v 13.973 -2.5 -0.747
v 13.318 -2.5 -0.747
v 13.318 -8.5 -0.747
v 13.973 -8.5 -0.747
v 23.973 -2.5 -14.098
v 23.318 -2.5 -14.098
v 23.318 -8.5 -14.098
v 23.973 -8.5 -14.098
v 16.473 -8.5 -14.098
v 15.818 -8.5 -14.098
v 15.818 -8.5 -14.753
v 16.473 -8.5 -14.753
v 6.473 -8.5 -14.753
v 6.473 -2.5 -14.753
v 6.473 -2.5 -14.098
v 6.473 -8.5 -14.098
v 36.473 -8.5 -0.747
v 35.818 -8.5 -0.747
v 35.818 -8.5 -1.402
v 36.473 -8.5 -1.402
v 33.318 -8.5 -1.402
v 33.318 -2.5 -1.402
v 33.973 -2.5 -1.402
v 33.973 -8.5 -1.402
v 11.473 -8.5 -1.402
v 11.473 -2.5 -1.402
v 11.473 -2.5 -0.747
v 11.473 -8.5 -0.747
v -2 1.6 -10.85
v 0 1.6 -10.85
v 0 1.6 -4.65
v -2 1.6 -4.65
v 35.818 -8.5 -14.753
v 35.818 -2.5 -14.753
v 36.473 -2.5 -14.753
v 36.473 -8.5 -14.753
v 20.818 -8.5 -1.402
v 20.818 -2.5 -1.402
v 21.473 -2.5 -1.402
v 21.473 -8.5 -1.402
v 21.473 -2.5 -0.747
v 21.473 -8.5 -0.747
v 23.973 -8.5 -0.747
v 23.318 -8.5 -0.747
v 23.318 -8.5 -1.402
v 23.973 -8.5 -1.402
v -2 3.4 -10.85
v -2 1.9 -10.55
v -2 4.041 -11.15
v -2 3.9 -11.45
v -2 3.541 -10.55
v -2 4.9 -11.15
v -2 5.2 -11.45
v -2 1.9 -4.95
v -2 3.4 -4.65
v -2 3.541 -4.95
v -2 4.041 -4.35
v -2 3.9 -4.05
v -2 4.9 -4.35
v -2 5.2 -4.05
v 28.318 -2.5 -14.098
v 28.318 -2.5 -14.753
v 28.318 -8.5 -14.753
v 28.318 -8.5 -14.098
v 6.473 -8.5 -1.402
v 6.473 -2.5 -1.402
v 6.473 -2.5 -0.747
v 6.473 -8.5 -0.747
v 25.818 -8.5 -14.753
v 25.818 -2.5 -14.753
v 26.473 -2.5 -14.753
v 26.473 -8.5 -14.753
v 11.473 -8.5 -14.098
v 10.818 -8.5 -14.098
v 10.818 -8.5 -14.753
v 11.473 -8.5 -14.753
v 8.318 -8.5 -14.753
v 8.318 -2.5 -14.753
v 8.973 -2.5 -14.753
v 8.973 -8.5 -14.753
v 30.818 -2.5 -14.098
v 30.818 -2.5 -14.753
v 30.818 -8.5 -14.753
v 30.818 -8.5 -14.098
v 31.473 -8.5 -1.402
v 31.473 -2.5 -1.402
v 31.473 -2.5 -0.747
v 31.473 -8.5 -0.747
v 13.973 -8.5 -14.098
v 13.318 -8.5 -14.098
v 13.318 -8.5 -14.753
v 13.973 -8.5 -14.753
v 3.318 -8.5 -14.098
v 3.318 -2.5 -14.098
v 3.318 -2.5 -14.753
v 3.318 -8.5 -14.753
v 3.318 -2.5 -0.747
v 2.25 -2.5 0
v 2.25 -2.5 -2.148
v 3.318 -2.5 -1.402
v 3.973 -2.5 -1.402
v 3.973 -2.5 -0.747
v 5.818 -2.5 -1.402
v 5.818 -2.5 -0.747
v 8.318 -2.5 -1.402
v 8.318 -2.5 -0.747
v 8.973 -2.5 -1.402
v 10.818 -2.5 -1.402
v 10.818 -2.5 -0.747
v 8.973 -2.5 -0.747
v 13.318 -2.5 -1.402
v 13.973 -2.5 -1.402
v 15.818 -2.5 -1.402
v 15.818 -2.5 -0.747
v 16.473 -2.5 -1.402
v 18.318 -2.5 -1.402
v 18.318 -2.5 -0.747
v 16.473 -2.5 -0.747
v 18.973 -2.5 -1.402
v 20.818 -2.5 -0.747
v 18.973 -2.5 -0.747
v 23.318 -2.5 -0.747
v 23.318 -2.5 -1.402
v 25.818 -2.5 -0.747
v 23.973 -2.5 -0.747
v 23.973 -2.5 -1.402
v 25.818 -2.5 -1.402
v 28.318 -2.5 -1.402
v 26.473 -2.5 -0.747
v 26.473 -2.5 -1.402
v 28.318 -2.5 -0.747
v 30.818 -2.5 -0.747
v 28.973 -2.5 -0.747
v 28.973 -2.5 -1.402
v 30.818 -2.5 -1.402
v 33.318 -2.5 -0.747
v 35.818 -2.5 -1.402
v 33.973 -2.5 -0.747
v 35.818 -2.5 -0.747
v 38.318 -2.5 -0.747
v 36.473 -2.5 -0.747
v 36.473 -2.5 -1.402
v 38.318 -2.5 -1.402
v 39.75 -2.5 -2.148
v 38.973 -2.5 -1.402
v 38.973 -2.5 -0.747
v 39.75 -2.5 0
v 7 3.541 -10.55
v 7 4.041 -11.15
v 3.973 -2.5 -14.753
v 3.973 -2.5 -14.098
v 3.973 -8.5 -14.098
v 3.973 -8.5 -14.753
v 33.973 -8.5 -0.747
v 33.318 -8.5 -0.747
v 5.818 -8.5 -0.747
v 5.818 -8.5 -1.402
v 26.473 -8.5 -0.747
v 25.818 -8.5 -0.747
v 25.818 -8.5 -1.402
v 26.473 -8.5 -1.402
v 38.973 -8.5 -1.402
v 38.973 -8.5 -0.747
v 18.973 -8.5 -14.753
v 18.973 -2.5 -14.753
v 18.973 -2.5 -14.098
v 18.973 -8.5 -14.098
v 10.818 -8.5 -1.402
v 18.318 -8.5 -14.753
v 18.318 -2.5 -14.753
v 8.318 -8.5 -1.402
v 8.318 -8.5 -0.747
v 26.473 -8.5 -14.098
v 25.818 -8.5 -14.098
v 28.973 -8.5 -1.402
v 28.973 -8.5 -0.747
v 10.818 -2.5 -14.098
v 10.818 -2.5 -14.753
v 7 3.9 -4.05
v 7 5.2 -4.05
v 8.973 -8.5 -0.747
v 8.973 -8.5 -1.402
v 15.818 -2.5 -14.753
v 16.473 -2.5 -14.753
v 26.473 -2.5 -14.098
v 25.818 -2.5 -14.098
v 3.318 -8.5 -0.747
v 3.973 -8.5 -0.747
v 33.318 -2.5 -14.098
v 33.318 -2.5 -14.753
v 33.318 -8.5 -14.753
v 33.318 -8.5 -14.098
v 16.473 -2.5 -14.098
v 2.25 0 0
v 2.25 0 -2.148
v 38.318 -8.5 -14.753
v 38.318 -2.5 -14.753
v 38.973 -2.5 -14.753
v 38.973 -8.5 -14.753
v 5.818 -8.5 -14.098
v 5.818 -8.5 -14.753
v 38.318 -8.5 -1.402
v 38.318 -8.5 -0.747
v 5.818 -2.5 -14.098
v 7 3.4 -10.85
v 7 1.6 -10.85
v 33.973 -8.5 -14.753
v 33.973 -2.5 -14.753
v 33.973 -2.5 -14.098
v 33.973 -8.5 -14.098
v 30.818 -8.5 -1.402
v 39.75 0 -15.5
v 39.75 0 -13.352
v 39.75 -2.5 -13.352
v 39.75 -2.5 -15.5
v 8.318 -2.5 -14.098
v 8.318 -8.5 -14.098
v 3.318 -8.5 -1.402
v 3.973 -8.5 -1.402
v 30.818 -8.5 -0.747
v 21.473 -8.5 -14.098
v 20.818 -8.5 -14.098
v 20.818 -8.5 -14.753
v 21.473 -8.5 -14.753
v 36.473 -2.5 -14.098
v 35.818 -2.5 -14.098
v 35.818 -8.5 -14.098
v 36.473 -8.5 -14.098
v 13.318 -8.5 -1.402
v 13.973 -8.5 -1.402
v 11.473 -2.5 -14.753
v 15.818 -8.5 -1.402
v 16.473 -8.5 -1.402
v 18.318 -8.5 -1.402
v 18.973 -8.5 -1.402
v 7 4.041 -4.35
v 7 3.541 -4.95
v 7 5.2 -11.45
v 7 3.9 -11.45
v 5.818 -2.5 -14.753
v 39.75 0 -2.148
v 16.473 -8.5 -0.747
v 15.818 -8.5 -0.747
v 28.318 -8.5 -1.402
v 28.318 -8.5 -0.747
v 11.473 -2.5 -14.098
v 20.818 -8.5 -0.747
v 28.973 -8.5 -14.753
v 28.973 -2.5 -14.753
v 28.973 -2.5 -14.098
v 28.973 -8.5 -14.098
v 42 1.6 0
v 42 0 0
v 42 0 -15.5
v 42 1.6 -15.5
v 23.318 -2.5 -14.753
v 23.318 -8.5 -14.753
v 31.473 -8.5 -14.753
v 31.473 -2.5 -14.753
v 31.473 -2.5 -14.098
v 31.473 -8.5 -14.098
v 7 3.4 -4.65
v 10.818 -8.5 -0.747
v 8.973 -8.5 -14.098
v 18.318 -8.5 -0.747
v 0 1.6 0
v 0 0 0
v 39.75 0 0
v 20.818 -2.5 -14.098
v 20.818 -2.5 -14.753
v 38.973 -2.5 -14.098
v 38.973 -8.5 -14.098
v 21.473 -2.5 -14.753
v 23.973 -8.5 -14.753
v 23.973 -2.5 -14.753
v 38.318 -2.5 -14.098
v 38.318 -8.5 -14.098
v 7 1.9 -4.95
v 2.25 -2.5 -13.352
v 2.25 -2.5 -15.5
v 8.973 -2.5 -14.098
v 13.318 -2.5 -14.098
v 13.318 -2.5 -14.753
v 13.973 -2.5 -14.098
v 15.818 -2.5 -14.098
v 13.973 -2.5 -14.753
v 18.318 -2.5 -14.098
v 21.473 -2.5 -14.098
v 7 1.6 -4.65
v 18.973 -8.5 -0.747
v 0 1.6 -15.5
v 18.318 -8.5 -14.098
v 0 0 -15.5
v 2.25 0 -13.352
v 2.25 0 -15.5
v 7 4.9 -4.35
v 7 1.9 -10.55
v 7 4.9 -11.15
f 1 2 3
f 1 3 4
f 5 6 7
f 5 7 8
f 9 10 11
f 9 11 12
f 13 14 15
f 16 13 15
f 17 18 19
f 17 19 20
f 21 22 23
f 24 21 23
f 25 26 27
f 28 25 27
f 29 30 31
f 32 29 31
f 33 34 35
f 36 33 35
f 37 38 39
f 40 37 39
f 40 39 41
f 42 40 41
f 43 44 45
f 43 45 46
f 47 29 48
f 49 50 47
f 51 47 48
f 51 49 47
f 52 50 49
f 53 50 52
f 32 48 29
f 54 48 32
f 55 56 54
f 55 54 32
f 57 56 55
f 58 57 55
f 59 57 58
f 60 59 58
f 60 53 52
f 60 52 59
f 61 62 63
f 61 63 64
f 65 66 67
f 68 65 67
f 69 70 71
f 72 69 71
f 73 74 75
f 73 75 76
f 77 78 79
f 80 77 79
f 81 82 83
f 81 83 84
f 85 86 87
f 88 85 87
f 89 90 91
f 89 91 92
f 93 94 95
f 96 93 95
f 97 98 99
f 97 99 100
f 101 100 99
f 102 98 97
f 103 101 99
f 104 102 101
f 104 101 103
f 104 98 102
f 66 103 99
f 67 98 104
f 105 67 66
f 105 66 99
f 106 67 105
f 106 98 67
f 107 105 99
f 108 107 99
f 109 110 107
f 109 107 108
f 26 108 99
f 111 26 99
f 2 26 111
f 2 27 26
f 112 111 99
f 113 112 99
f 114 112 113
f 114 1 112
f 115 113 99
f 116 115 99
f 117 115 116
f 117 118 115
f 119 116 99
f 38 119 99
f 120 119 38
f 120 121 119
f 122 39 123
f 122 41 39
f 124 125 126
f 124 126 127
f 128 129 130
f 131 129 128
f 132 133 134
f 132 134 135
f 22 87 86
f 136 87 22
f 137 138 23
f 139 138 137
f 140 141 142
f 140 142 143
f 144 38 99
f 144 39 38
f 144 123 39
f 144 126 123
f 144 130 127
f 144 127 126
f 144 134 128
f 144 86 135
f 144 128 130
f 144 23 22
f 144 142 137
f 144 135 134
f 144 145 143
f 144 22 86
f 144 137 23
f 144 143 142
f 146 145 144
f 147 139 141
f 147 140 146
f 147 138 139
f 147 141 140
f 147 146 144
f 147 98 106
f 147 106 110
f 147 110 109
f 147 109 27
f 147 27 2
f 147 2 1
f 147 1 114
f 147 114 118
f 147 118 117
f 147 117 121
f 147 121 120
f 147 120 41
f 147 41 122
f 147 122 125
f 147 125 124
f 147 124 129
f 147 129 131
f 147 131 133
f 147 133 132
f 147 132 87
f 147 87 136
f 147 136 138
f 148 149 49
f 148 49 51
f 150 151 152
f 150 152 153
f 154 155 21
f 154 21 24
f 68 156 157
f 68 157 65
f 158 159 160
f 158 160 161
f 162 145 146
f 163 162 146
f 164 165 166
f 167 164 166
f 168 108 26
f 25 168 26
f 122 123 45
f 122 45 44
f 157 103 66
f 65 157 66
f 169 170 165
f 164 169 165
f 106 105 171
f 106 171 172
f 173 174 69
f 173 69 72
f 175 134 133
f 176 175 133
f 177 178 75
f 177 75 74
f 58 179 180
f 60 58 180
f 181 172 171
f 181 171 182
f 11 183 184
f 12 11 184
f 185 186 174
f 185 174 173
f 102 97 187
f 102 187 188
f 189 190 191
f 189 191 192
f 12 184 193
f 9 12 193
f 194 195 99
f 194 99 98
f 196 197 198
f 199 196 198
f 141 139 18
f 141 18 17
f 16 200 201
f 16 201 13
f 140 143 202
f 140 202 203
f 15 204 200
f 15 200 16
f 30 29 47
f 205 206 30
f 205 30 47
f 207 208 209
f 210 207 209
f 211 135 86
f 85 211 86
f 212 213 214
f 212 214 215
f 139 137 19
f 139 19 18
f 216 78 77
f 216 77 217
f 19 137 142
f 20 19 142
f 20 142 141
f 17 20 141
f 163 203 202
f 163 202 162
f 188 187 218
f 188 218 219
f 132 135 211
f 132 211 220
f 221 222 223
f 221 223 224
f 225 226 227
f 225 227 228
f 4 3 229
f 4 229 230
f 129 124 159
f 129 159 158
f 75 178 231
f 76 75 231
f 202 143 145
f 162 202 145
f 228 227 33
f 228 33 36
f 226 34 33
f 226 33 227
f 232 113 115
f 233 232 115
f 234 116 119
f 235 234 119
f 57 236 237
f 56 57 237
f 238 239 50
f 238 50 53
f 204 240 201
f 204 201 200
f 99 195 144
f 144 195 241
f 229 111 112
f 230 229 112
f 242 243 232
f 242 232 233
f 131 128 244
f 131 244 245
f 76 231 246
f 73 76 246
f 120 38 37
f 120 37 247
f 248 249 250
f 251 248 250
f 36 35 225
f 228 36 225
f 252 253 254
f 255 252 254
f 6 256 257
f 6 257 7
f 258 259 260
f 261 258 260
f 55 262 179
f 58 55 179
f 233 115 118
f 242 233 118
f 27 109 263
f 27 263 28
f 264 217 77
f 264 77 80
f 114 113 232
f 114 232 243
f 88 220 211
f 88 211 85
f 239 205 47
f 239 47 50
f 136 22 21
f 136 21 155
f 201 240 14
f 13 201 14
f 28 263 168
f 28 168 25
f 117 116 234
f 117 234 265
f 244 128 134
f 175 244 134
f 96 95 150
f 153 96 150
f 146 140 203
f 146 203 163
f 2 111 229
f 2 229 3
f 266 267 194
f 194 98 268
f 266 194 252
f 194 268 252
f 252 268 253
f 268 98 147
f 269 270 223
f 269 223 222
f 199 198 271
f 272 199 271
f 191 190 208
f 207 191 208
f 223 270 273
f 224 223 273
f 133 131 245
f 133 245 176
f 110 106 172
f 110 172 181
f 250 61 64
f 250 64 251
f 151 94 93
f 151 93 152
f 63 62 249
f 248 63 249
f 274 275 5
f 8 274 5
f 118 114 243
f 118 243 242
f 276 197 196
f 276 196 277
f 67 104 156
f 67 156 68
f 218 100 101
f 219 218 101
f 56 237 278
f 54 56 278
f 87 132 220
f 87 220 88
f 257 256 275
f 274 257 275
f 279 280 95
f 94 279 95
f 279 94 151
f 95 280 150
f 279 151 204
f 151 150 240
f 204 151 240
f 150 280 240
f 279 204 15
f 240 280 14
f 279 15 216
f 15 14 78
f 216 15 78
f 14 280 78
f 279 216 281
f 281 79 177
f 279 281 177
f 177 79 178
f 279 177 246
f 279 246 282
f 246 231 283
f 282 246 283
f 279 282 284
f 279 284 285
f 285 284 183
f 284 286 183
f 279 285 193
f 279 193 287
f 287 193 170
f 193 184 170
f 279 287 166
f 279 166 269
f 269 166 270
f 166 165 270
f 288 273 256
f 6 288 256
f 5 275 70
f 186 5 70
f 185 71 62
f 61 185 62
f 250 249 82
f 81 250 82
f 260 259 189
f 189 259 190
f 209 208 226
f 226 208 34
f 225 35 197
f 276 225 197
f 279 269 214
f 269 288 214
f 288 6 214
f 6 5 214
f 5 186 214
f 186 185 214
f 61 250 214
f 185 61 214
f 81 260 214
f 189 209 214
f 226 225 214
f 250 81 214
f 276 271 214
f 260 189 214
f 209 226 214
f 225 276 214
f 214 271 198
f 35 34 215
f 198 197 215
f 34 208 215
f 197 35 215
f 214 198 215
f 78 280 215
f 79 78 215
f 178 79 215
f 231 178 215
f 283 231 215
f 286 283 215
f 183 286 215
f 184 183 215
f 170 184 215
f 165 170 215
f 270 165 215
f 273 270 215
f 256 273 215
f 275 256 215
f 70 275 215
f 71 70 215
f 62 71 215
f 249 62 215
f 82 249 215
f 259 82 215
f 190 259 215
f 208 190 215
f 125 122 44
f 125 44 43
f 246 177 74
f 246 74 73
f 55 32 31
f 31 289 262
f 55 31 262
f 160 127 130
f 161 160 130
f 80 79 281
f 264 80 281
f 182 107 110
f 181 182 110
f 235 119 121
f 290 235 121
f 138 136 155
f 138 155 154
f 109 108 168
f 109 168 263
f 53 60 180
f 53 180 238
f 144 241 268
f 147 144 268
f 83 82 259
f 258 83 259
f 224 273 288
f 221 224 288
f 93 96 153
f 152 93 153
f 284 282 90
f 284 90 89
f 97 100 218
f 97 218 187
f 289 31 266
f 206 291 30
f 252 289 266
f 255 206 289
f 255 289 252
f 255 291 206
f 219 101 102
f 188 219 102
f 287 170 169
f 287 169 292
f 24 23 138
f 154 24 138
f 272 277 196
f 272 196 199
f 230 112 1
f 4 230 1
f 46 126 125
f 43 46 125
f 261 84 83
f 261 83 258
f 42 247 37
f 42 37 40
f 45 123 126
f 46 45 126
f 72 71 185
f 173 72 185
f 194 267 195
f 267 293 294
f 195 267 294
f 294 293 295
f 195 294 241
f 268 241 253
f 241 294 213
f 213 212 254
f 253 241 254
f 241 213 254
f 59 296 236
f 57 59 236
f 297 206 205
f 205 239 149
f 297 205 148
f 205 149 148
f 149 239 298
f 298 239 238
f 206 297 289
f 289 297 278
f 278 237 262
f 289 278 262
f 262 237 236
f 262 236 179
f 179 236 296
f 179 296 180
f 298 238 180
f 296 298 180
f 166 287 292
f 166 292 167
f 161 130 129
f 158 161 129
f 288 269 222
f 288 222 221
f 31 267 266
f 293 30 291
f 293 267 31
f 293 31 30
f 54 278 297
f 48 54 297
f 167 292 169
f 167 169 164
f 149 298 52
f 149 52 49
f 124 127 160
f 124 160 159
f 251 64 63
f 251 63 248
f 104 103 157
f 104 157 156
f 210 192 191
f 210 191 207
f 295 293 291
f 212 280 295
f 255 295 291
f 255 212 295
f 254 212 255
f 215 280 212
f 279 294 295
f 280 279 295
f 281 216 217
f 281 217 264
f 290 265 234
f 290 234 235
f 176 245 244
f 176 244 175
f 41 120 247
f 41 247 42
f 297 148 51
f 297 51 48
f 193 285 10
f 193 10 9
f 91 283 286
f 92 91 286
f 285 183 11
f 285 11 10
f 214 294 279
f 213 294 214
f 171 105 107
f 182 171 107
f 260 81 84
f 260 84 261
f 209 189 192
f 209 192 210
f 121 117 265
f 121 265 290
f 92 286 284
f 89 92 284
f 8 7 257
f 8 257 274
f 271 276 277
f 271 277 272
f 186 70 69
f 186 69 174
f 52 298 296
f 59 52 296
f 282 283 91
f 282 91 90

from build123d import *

# Parameters (mm, degrees)
SKETCH1_W                = 42
SKETCH1_H                = 15.5
BOSS_EXTRUDE1_DEPTH      = 1.6
EXTRUDE_THIN1_START      = -7
EXTRUDE_THIN1_DEPTH      = 9
SKETCH3_W                = 18.75
SKETCH3_H                = 2.148280867
BOSS_EXTRUDE2_DEPTH      = 2.5
SKETCH4_W                = 0.654719532
SKETCH4_H                = 0.654719531
BOSS_EXTRUDE3_DEPTH      = 6
LPATTERN1_COUNT          = 15
LPATTERN1_PITCH          = 2.5
MIRROR4_COPY_1_SKETCH_W  = 0.654719532
MIRROR4_COPY_1_SKETCH_H  = 0.654719531
MIRROR4_COPY_1_DEPTH     = 6
MIRROR4_COPY_2_SKETCH_W  = 0.654719532
MIRROR4_COPY_2_SKETCH_H  = 0.654719531
MIRROR4_COPY_2_DEPTH     = 6
MIRROR4_COPY_3_SKETCH_W  = 0.654719532
MIRROR4_COPY_3_SKETCH_H  = 0.654719531
MIRROR4_COPY_3_DEPTH     = 6
MIRROR4_COPY_4_SKETCH_W  = 0.654719532
MIRROR4_COPY_4_SKETCH_H  = 0.654719531
MIRROR4_COPY_4_DEPTH     = 6
MIRROR4_COPY_5_SKETCH_W  = 0.654719532
MIRROR4_COPY_5_SKETCH_H  = 0.654719531
MIRROR4_COPY_5_DEPTH     = 6
MIRROR4_COPY_6_SKETCH_W  = 0.654719532
MIRROR4_COPY_6_SKETCH_H  = 0.654719531
MIRROR4_COPY_6_DEPTH     = 6
MIRROR4_COPY_7_SKETCH_W  = 0.654719532
MIRROR4_COPY_7_SKETCH_H  = 0.654719531
MIRROR4_COPY_7_DEPTH     = 6
MIRROR4_COPY_8_SKETCH_W  = 0.654719532
MIRROR4_COPY_8_SKETCH_H  = 0.654719531
MIRROR4_COPY_8_DEPTH     = 6
MIRROR4_COPY_9_SKETCH_W  = 0.654719532
MIRROR4_COPY_9_SKETCH_H  = 0.654719531
MIRROR4_COPY_9_DEPTH     = 6
MIRROR4_COPY_10_SKETCH_W = 0.654719532
MIRROR4_COPY_10_SKETCH_H = 0.654719531
MIRROR4_COPY_10_DEPTH    = 6
MIRROR4_COPY_11_SKETCH_W = 0.654719532
MIRROR4_COPY_11_SKETCH_H = 0.654719531
MIRROR4_COPY_11_DEPTH    = 6
MIRROR4_COPY_12_SKETCH_W = 0.654719532
MIRROR4_COPY_12_SKETCH_H = 0.654719531
MIRROR4_COPY_12_DEPTH    = 6
MIRROR4_COPY_13_SKETCH_W = 0.654719532
MIRROR4_COPY_13_SKETCH_H = 0.654719531
MIRROR4_COPY_13_DEPTH    = 6
MIRROR4_COPY_14_SKETCH_W = 0.654719532
MIRROR4_COPY_14_SKETCH_H = 0.654719531
MIRROR4_COPY_14_DEPTH    = 6


with BuildPart() as part:
    # Sketch1 → Boss-Extrude1 (new body)
    with BuildSketch(Plane(origin=(0, 0, 0), x_dir=(1, 0, 0), z_dir=(0, 1, 0))):
        with Locations((21, 7.75)):
            Rectangle(SKETCH1_W, SKETCH1_H)
    extrude(amount=BOSS_EXTRUDE1_DEPTH)

    # Sketch2 → Extrude-Thin1 (add)
    with BuildSketch(Plane.ZY.offset(EXTRUDE_THIN1_START)):
        Polygon((-7.75, 1.6), (-10.85, 1.6), (-10.85, 3.4), (-11.45, 3.9), (-11.45, 5.2), (-7.75, 5.2), (-7.75, 4.9), (-11.15, 4.9), (-11.15, 4.040512484), (-10.55, 3.540512484), (-10.55, 1.9), (-7.75, 1.9), align=None)
    extrude_thin1 = extrude(amount=EXTRUDE_THIN1_DEPTH)

    # Mirror1: Extrude-Thin1 across plane
    add(extrude_thin1.mirror(Plane.XY.offset(-7.75)))

    # Sketch3 → Boss-Extrude2 (add)
    with BuildSketch(Plane.XZ):
        with Locations((11.625, -1.074140433)):
            Rectangle(SKETCH3_W, SKETCH3_H)
        with Locations((30.375, -1.074140433)):
            Rectangle(SKETCH3_W, SKETCH3_H)
    boss_extrude2 = extrude(amount=BOSS_EXTRUDE2_DEPTH)

    # Sketch4 → Boss-Extrude3 (add)
    with BuildSketch(Plane.XZ.offset(2.5)):
        with Locations((3.64534799, -1.074140433)):
            Rectangle(SKETCH4_W, SKETCH4_H)
    boss_extrude3 = extrude(amount=BOSS_EXTRUDE3_DEPTH)

    # LPattern1: Boss-Extrude3 ×15
    with Locations(*[(i * LPATTERN1_PITCH, 0, 0) for i in range(1, LPATTERN1_COUNT)]):
        add(boss_extrude3)

    # Mirror3: Boss-Extrude2 across plane
    add(boss_extrude2.mirror(Plane.XY.offset(-7.75)))

    # Mirror4: Boss-Extrude3 across plane
    add(boss_extrude3.mirror(Plane.XY.offset(-7.75)))

    # Mirror4 copy 1 sketch → Mirror4 copy 1 (add)
    with BuildSketch(Plane(origin=(2.5, -2.5, -15.5), x_dir=(1, 0, 0), z_dir=(0, -1, 0))):
        with Locations((3.64534799, 1.074140433)):
            Rectangle(MIRROR4_COPY_1_SKETCH_W, MIRROR4_COPY_1_SKETCH_H)
    extrude(amount=MIRROR4_COPY_1_DEPTH)

    # Mirror4 copy 2 sketch → Mirror4 copy 2 (add)
    with BuildSketch(Plane(origin=(5, -2.5, -15.5), x_dir=(1, 0, 0), z_dir=(0, -1, 0))):
        with Locations((3.64534799, 1.074140433)):
            Rectangle(MIRROR4_COPY_2_SKETCH_W, MIRROR4_COPY_2_SKETCH_H)
    extrude(amount=MIRROR4_COPY_2_DEPTH)

    # Mirror4 copy 3 sketch → Mirror4 copy 3 (add)
    with BuildSketch(Plane(origin=(7.5, -2.5, -15.5), x_dir=(1, 0, 0), z_dir=(0, -1, 0))):
        with Locations((3.64534799, 1.074140433)):
            Rectangle(MIRROR4_COPY_3_SKETCH_W, MIRROR4_COPY_3_SKETCH_H)
    extrude(amount=MIRROR4_COPY_3_DEPTH)

    # Mirror4 copy 4 sketch → Mirror4 copy 4 (add)
    with BuildSketch(Plane(origin=(10, -2.5, -15.5), x_dir=(1, 0, 0), z_dir=(0, -1, 0))):
        with Locations((3.64534799, 1.074140433)):
            Rectangle(MIRROR4_COPY_4_SKETCH_W, MIRROR4_COPY_4_SKETCH_H)
    extrude(amount=MIRROR4_COPY_4_DEPTH)

    # Mirror4 copy 5 sketch → Mirror4 copy 5 (add)
    with BuildSketch(Plane(origin=(12.5, -2.5, -15.5), x_dir=(1, 0, 0), z_dir=(0, -1, 0))):
        with Locations((3.64534799, 1.074140433)):
            Rectangle(MIRROR4_COPY_5_SKETCH_W, MIRROR4_COPY_5_SKETCH_H)
    extrude(amount=MIRROR4_COPY_5_DEPTH)

    # Mirror4 copy 6 sketch → Mirror4 copy 6 (add)
    with BuildSketch(Plane(origin=(15, -2.5, -15.5), x_dir=(1, 0, 0), z_dir=(0, -1, 0))):
        with Locations((3.64534799, 1.074140433)):
            Rectangle(MIRROR4_COPY_6_SKETCH_W, MIRROR4_COPY_6_SKETCH_H)
    extrude(amount=MIRROR4_COPY_6_DEPTH)

    # Mirror4 copy 7 sketch → Mirror4 copy 7 (add)
    with BuildSketch(Plane(origin=(17.5, -2.5, -15.5), x_dir=(1, 0, 0), z_dir=(0, -1, 0))):
        with Locations((3.64534799, 1.074140433)):
            Rectangle(MIRROR4_COPY_7_SKETCH_W, MIRROR4_COPY_7_SKETCH_H)
    extrude(amount=MIRROR4_COPY_7_DEPTH)

    # Mirror4 copy 8 sketch → Mirror4 copy 8 (add)
    with BuildSketch(Plane(origin=(20, -2.5, -15.5), x_dir=(1, 0, 0), z_dir=(0, -1, 0))):
        with Locations((3.64534799, 1.074140433)):
            Rectangle(MIRROR4_COPY_8_SKETCH_W, MIRROR4_COPY_8_SKETCH_H)
    extrude(amount=MIRROR4_COPY_8_DEPTH)

    # Mirror4 copy 9 sketch → Mirror4 copy 9 (add)
    with BuildSketch(Plane(origin=(22.5, -2.5, -15.5), x_dir=(1, 0, 0), z_dir=(0, -1, 0))):
        with Locations((3.64534799, 1.074140433)):
            Rectangle(MIRROR4_COPY_9_SKETCH_W, MIRROR4_COPY_9_SKETCH_H)
    extrude(amount=MIRROR4_COPY_9_DEPTH)

    # Mirror4 copy 10 sketch → Mirror4 copy 10 (add)
    with BuildSketch(Plane(origin=(25, -2.5, -15.5), x_dir=(1, 0, 0), z_dir=(0, -1, 0))):
        with Locations((3.64534799, 1.074140433)):
            Rectangle(MIRROR4_COPY_10_SKETCH_W, MIRROR4_COPY_10_SKETCH_H)
    extrude(amount=MIRROR4_COPY_10_DEPTH)

    # Mirror4 copy 11 sketch → Mirror4 copy 11 (add)
    with BuildSketch(Plane(origin=(27.5, -2.5, -15.5), x_dir=(1, 0, 0), z_dir=(0, -1, 0))):
        with Locations((3.64534799, 1.074140433)):
            Rectangle(MIRROR4_COPY_11_SKETCH_W, MIRROR4_COPY_11_SKETCH_H)
    extrude(amount=MIRROR4_COPY_11_DEPTH)

    # Mirror4 copy 12 sketch → Mirror4 copy 12 (add)
    with BuildSketch(Plane(origin=(30, -2.5, -15.5), x_dir=(1, 0, 0), z_dir=(0, -1, 0))):
        with Locations((3.64534799, 1.074140433)):
            Rectangle(MIRROR4_COPY_12_SKETCH_W, MIRROR4_COPY_12_SKETCH_H)
    extrude(amount=MIRROR4_COPY_12_DEPTH)

    # Mirror4 copy 13 sketch → Mirror4 copy 13 (add)
    with BuildSketch(Plane(origin=(32.5, -2.5, -15.5), x_dir=(1, 0, 0), z_dir=(0, -1, 0))):
        with Locations((3.64534799, 1.074140433)):
            Rectangle(MIRROR4_COPY_13_SKETCH_W, MIRROR4_COPY_13_SKETCH_H)
    extrude(amount=MIRROR4_COPY_13_DEPTH)

    # Mirror4 copy 14 sketch → Mirror4 copy 14 (add)
    with BuildSketch(Plane(origin=(35, -2.5, -15.5), x_dir=(1, 0, 0), z_dir=(0, -1, 0))):
        with Locations((3.64534799, 1.074140433)):
            Rectangle(MIRROR4_COPY_14_SKETCH_W, MIRROR4_COPY_14_SKETCH_H)
    extrude(amount=MIRROR4_COPY_14_DEPTH)


solid = part.part
